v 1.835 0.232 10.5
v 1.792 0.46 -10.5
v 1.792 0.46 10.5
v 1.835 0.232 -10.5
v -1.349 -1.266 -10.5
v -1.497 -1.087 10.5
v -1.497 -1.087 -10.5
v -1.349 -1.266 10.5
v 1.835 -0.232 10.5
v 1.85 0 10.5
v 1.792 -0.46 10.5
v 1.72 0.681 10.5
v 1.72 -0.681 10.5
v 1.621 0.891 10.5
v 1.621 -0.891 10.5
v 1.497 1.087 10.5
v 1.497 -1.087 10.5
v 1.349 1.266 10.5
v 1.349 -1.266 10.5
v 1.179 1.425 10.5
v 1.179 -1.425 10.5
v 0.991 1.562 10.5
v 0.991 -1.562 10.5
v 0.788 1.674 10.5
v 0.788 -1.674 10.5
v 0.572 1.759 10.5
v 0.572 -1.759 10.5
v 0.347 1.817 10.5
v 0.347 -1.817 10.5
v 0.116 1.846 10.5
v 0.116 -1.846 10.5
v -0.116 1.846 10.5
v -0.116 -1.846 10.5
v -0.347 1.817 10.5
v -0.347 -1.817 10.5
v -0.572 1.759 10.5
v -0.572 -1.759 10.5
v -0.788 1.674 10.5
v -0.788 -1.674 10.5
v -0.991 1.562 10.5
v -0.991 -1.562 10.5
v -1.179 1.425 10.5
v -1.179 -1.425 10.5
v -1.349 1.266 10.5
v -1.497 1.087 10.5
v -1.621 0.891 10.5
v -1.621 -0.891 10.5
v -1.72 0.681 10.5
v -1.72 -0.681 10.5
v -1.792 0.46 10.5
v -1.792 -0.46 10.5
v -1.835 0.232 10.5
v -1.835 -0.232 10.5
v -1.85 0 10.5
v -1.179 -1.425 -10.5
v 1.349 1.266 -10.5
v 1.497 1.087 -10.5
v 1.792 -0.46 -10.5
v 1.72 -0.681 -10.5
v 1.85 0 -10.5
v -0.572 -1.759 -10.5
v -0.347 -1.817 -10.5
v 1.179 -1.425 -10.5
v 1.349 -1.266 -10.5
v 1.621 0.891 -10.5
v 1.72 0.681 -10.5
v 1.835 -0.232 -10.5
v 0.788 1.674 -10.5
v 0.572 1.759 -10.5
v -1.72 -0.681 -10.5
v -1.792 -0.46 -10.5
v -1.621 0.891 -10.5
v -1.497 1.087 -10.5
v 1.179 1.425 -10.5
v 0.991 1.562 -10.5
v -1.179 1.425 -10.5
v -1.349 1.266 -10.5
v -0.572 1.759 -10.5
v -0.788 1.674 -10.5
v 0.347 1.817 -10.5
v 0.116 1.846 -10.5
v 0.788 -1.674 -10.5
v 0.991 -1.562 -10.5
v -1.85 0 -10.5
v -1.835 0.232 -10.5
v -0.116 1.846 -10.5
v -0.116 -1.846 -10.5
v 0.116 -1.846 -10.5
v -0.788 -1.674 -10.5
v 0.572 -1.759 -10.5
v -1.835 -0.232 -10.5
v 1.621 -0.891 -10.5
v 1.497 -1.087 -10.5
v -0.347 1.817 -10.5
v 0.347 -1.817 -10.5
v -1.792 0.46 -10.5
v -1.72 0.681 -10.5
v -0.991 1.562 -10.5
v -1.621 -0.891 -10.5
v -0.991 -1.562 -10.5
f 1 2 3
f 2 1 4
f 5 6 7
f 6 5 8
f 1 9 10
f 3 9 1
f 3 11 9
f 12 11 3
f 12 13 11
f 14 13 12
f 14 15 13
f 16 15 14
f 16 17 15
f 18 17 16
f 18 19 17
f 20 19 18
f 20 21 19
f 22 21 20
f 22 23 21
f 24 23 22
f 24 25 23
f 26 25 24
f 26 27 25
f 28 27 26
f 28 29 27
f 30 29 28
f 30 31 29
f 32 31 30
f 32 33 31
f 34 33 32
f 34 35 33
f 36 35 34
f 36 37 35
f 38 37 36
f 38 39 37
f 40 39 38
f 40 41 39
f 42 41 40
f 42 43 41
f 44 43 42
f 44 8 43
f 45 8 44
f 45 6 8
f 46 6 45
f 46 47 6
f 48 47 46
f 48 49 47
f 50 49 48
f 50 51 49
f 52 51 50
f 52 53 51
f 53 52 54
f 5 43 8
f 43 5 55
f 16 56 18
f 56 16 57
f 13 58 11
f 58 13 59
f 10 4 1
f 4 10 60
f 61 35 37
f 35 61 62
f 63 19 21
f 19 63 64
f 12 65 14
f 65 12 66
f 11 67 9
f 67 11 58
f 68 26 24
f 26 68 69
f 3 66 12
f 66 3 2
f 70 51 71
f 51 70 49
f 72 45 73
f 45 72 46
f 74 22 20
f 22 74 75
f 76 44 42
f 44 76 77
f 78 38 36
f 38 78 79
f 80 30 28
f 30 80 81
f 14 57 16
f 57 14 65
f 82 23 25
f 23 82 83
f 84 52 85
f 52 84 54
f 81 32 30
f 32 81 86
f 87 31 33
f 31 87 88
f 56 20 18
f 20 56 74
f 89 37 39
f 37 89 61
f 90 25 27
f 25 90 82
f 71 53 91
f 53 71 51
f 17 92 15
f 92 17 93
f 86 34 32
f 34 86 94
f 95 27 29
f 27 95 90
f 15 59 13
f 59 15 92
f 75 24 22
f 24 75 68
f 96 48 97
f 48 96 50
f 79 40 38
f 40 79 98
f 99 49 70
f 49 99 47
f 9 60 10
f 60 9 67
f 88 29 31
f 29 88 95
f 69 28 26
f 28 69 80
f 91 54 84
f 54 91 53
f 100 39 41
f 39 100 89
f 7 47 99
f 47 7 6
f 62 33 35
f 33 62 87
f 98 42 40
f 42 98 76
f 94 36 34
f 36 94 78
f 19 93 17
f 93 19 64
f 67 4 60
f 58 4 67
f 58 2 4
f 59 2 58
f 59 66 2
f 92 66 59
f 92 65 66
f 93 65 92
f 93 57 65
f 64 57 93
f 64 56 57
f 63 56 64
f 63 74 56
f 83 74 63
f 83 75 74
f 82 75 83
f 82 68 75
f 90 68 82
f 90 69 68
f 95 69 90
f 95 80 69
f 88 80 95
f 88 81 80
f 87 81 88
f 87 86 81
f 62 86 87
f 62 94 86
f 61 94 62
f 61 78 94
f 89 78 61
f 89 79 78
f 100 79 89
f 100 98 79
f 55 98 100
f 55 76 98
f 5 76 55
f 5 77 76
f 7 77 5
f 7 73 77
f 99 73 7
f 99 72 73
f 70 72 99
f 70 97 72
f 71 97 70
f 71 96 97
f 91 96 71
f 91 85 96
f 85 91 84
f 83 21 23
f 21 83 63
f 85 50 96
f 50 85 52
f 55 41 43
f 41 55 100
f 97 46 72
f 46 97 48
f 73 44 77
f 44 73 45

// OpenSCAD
$fn = 50;


difference() {
	union() {
		translate(v = [0, 0, -10.5000000000]) {
			cylinder(h = 21, r = 1.8500000000);
		}
	}
	union() {
		translate(v = [0, 0, -100.0000000000]) {
			cylinder(h = 200, r = 0);
		}
	}
}
